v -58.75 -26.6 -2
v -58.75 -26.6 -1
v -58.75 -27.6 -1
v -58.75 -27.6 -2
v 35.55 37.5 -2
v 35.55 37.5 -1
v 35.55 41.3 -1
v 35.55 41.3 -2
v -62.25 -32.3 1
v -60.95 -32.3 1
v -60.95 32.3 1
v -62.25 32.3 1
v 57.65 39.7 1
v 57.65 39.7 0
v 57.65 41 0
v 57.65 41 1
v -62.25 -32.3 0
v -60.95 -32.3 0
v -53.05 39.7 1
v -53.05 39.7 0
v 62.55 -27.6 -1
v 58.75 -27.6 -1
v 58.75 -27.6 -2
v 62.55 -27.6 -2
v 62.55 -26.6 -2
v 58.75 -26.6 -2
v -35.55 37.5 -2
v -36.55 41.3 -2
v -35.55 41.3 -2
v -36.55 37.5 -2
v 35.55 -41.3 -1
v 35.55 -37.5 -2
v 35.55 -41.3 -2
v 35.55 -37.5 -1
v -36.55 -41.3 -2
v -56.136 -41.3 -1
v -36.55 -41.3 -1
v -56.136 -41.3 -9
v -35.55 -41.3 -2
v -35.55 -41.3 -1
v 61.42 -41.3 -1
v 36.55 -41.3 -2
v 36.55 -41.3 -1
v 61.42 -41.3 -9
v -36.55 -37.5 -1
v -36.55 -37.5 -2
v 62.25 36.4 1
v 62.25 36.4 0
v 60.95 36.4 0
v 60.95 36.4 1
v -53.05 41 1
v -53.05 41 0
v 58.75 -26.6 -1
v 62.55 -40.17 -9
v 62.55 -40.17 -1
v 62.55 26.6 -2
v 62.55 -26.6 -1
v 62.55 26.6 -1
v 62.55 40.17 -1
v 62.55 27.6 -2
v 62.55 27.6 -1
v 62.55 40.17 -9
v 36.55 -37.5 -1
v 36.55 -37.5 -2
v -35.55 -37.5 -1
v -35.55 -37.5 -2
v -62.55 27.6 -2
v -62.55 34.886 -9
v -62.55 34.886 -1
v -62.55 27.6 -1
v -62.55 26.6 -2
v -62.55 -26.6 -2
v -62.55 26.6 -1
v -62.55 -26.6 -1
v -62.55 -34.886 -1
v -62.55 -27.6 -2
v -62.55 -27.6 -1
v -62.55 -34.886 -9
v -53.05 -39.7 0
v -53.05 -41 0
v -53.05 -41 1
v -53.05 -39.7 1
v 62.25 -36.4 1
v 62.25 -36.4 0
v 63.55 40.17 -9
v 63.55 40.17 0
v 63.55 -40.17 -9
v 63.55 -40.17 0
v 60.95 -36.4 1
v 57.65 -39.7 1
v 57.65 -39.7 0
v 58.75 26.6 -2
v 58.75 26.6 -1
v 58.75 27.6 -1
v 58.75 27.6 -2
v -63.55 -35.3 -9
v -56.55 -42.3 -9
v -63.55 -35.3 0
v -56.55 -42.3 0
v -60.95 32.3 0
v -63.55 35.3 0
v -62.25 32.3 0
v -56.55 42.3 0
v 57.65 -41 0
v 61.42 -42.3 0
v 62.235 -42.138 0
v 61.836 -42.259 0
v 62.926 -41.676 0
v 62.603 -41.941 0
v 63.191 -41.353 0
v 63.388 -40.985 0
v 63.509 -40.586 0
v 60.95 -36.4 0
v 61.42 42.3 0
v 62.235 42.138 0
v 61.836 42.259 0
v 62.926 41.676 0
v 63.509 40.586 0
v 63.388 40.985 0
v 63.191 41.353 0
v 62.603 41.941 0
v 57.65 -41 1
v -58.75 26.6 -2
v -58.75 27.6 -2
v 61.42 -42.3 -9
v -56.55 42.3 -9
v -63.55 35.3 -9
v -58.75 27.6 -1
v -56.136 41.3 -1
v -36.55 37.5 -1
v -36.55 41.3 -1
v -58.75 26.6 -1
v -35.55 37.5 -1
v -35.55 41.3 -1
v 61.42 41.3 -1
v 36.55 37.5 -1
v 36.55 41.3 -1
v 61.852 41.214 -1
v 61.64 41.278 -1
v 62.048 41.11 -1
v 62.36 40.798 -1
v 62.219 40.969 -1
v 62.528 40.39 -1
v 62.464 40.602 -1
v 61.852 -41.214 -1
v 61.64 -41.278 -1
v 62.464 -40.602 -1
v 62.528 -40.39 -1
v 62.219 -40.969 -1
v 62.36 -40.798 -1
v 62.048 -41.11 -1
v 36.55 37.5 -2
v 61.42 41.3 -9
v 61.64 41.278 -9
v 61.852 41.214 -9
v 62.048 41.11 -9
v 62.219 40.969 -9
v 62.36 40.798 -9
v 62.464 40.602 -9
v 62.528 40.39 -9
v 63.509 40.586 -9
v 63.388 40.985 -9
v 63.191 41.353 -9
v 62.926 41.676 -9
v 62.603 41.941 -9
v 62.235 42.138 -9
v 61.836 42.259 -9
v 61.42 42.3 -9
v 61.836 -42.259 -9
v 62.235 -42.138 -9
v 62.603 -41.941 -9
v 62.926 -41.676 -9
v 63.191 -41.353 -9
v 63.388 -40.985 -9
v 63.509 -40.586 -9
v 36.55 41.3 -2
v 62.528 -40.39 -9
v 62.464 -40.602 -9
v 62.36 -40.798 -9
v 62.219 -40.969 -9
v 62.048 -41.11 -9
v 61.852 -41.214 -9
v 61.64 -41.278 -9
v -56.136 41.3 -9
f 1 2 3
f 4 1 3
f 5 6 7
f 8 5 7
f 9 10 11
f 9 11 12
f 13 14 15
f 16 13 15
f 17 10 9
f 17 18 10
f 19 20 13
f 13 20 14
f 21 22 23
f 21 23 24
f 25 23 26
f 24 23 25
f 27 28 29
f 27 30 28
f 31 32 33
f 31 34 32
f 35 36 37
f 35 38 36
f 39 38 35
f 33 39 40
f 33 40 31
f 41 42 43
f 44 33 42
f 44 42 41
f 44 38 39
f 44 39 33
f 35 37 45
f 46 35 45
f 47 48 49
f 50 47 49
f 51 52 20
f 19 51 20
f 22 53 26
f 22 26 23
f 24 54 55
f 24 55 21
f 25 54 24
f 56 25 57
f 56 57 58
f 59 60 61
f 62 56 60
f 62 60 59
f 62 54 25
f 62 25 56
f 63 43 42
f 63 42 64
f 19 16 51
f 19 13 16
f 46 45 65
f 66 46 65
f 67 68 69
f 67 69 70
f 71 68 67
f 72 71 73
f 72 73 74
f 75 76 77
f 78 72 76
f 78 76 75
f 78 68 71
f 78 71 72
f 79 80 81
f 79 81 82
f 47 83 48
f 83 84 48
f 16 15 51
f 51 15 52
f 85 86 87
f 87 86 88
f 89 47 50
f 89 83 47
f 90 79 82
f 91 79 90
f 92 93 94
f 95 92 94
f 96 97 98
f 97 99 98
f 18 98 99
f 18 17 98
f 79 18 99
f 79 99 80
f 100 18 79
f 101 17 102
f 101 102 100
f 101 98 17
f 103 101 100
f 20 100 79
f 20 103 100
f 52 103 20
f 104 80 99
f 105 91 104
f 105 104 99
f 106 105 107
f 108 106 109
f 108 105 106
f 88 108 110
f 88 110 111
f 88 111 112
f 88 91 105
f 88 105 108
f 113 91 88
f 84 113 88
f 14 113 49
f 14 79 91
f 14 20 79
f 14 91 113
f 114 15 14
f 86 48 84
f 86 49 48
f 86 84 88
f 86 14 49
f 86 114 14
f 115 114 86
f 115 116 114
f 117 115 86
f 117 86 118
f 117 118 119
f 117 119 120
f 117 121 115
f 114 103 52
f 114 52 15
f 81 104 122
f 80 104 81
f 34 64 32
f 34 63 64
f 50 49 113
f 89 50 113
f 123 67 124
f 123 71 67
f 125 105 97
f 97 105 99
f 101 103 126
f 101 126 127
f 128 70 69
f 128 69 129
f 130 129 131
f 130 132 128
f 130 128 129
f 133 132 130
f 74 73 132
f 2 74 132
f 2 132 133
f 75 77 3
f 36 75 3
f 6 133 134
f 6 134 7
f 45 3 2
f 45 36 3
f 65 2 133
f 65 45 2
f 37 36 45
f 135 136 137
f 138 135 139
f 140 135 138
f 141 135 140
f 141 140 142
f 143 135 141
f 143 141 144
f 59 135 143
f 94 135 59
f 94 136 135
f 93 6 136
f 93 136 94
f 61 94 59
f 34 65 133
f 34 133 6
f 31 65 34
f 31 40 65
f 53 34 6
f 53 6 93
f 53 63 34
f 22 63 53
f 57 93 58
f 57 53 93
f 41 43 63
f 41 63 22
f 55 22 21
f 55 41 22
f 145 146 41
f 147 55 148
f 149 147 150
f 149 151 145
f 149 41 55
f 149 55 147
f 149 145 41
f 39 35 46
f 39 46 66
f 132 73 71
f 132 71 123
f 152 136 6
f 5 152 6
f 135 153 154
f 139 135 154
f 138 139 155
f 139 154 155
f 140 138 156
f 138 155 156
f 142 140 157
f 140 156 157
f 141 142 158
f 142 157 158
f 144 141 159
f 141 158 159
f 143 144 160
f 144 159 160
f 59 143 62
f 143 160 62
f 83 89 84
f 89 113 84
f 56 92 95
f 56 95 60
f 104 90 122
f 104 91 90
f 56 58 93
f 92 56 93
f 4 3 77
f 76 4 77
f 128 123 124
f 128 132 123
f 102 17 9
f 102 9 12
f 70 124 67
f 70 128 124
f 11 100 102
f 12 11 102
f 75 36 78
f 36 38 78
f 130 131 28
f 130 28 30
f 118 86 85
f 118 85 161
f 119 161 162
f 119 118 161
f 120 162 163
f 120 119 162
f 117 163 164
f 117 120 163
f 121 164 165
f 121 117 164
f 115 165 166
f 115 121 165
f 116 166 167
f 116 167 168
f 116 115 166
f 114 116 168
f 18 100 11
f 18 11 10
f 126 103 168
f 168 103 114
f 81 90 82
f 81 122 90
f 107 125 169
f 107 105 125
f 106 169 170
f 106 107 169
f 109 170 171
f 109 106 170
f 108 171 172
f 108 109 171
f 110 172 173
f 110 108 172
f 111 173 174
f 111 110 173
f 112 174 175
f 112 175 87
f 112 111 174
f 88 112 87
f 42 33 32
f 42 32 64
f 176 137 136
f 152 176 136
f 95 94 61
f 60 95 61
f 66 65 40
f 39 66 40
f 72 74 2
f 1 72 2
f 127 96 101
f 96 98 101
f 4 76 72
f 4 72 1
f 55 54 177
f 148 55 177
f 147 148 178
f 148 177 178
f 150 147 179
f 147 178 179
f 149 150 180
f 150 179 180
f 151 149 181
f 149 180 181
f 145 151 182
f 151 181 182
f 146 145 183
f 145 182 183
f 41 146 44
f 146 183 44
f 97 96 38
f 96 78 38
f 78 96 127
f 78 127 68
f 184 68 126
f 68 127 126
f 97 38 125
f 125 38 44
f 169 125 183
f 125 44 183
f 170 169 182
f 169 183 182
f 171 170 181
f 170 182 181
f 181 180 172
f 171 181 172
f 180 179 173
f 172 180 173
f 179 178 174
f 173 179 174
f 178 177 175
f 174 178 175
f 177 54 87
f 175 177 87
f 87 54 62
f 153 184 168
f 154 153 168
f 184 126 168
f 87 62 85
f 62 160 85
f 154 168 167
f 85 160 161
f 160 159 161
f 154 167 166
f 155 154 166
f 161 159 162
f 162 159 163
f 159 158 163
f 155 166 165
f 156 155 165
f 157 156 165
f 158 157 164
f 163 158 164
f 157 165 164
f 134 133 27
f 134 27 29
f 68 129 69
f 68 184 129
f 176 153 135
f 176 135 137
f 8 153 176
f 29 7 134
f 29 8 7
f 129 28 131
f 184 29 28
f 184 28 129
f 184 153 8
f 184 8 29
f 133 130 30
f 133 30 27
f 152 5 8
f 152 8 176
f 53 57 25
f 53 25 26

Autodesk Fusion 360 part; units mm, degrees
sketch "Sketch1" plane through (0, 0, 0) normal (0, 0, 1) x (1, 0, 0)
  line L0 (61.42, -42.3) -> (-56.55, -42.3)
  line L1 (-63.55, -35.3) -> (-63.55, 35.3)
  line L2 (-56.55, 42.3) -> (61.42, 42.3)
  line L3 (63.55, 40.17) -> (63.55, -40.17)
  line L4 (63.55, -42.3) -> (-63.55, 42.3) construction
  line L5 (-63.55, -42.3) -> (63.55, 42.3) construction
  line L6 (-56.55, 42.3) -> (-63.55, 35.3)
  line L7 (0, -42.3) -> (0, 42.3) construction
  line L8 (63.55, 0) -> (-63.55, 0) construction
  line L9 (-56.55, -42.3) -> (-63.55, -35.3)
  arc A0 (63.55, 40.17) -> (61.42, 42.3) centre (61.42, 40.17) ccw
  arc A1 (61.42, -42.3) -> (63.55, -40.17) centre (61.42, -40.17) ccw
  dimension "d1" = 84.6
  dimension "d2" = 127.1
  dimension "d3" = 7
  dimension "d4" = 7
  dimension "d5" = 2.13
extrude "Extrude1" add sketch "Sketch1" against normal blind 9
sketch "Sketch2" plane through (0, 0, -9) normal (0, 0, -1) x (1, 0, 0)
  line L0 (61.42, 42.3) -> (-56.55, 42.3)
  line L1 (-56.55, 42.3) -> (-63.55, 35.3)
  line L2 (-63.55, 35.3) -> (-63.55, -35.3)
  line L3 (-63.55, -35.3) -> (-56.55, -42.3)
  line L4 (-56.55, -42.3) -> (61.42, -42.3)
  arc A0 (61.42, -42.3) -> (63.55, -40.17) centre (61.42, -40.17) ccw
  line L5 (63.55, -40.17) -> (63.55, 40.17)
  arc A1 (63.55, 40.17) -> (61.42, 42.3) centre (61.42, 40.17) ccw
  line L6 (61.42, -41.3) -> (-56.1358, -41.3)
  line L7 (-62.55, -34.8858) -> (-62.55, 34.8858)
  line L8 (-56.1358, 41.3) -> (61.42, 41.3)
  line L9 (62.55, 40.17) -> (62.55, -40.17)
  line L10 (62.55, -41.3) -> (-62.55, 41.3) construction
  line L11 (-62.55, -41.3) -> (62.55, 41.3) construction
  line L12 (-56.1358, 41.3) -> (-62.55, 34.8858)
  arc A2 (62.55, 40.17) -> (61.42, 41.3) centre (61.42, 40.17) ccw
  line L13 (63.55, 0) -> (-63.55, 0) construction
  line L14 (-56.1358, -41.3) -> (-62.55, -34.8858)
  arc A3 (61.42, -41.3) -> (62.55, -40.17) centre (61.42, -40.17) ccw
  dimension "d8" = 125.1
  dimension "d9" = 82.6
  dimension "d10" = 6.4142
  dimension "d11" = 6.4142
  dimension "d12" = 1
  dimension "d13" = 1.13
extrude "Extrude2" cut sketch "Sketch2" against normal blind 8 contours L6 L7 L8 L9 L12 A2 L14 A3
sketch "Sketch3" plane through (0, 0, -1) normal (0, 0, -1) x (1, 0, 0)
  line L0 (-56.1358, -41.3) -> (61.42, -41.3)
  arc A0 (61.42, -41.3) -> (62.55, -40.17) centre (61.42, -40.17) ccw
  line L1 (62.55, -40.17) -> (62.55, 40.17)
  arc A1 (62.55, 40.17) -> (61.42, 41.3) centre (61.42, 40.17) ccw
  line L2 (61.42, 41.3) -> (-56.1358, 41.3)
  line L3 (-56.1358, 41.3) -> (-62.55, 34.8858)
  line L4 (-62.55, 34.8858) -> (-62.55, -34.8858)
  line L5 (-62.55, -34.8858) -> (-56.1358, -41.3)
  line L6 (-62.55, 32.8642) -> (-35.55, 32.8642) construction
  line L7 (-35.55, 32.8642) -> (-35.55, 41.3) construction
  line L8 (-35.55, 41.3) -> (-36.55, 41.3)
  line L9 (-36.55, 41.3) -> (-36.55, 37.5)
  line L10 (-36.55, 37.5) -> (-35.55, 37.5)
  line L11 (-35.55, 37.5) -> (-35.55, 41.3)
  line L12 (-50.2731, 41.3) -> (-50.2731, 26.6) construction
  line L13 (-50.2731, 26.6) -> (-62.55, 26.6) construction
  line L14 (-62.55, 26.6) -> (-58.75, 26.6)
  line L15 (-58.75, 26.6) -> (-58.75, 27.6)
  line L16 (-58.75, 27.6) -> (-62.55, 27.6)
  line L17 (-62.55, 27.6) -> (-62.55, 26.6)
  line L18 (62.55, 0) -> (-62.55, 0) construction
  line L19 (-62.55, 30.673) -> (-62.55, 55) construction
  line L20 (62.55, 34.8173) -> (62.55, 55) construction
  line L21 (62.55, 55) -> (-62.55, 55) construction
  line L22 (0, 55) -> (0, -41.3) construction
  line L23 (62.55, 27.6) -> (62.55, 26.6)
  line L24 (62.55, 26.6) -> (58.75, 26.6)
  line L25 (58.75, 27.6) -> (62.55, 27.6)
  line L26 (58.75, 26.6) -> (58.75, 27.6)
  line L27 (36.55, 41.3) -> (36.55, 37.5)
  line L28 (35.55, 37.5) -> (35.55, 41.3)
  line L29 (36.55, 37.5) -> (35.55, 37.5)
  line L30 (35.55, 41.3) -> (36.55, 41.3)
  line L31 (62.55, -26.6) -> (58.75, -26.6)
  line L32 (58.75, -27.6) -> (62.55, -27.6)
  line L33 (58.75, -26.6) -> (58.75, -27.6)
  line L34 (35.55, -37.5) -> (35.55, -41.3)
  line L35 (36.55, -37.5) -> (35.55, -37.5)
  line L36 (36.55, -41.3) -> (36.55, -37.5)
  line L37 (62.55, -27.6) -> (62.55, -26.6)
  line L38 (35.55, -41.3) -> (36.55, -41.3)
  line L39 (-58.75, -26.6) -> (-58.75, -27.6)
  line L40 (-62.55, -26.6) -> (-58.75, -26.6)
  line L41 (-58.75, -27.6) -> (-62.55, -27.6)
  line L42 (-62.55, -27.6) -> (-62.55, -26.6)
  line L43 (-36.55, -37.5) -> (-35.55, -37.5)
  line L44 (-35.55, -37.5) -> (-35.55, -41.3)
  line L45 (-36.55, -41.3) -> (-36.55, -37.5)
  line L46 (-35.55, -41.3) -> (-36.55, -41.3)
  dimension "d16" = 27
  dimension "d17" = 3.8
  dimension "d18" = 1
  dimension "d19" = 14.7
  dimension "d20" = 3.8
  dimension "d21" = 1
extrude "Extrude3" add sketch "Sketch3" along normal blind 1 contours L0 L43 L44 L45 L46 | L4 L39 L40 L41 L42 | L0 L34 L35 L36 L38 | L4 L14 L15 L16 L17 | L1 L31 L32 L33 L37 | L2 L8 L9 L10 L11 | L1 L23 L24 L25 L26 | L2 L27 L28 L29 L30
sketch "Sketch4" plane through (0, 0, 0) normal (0, 0, 1) x (-1, 0, 0)
  line L0 (56.55, 42.3) -> (-61.42, 42.3)
  arc A0 (-61.42, 42.3) -> (-63.55, 40.17) centre (-61.42, 40.17) ccw
  line L1 (-63.55, 40.17) -> (-63.55, -40.17)
  arc A1 (-63.55, -40.17) -> (-61.42, -42.3) centre (-61.42, -40.17) ccw
  line L2 (-61.42, -42.3) -> (56.55, -42.3)
  line L3 (56.55, -42.3) -> (63.55, -35.3)
  line L4 (63.55, -35.3) -> (63.55, 35.3)
  line L5 (63.55, 35.3) -> (56.55, 42.3)
  line L6 (-63.55, -34.3916) -> (-62.25, -34.3916) construction
  line L7 (-62.25, -34.3916) -> (-62.25, -36.4) construction
  line L8 (-60, -42.3) -> (-66.2, -42.3) construction
  line L9 (-63.55, -39.2433) -> (-63.55, -43.1) construction
  line L10 (-62.25, -36.4) -> (-60.95, -36.4)
  line L11 (-60.95, -36.4) -> (-60.95, 36.4)
  line L12 (-60.95, 36.4) -> (-62.25, 36.4)
  line L13 (-62.25, 36.4) -> (-62.25, -36.4)
  line L14 (-52.6219, -42.3) -> (-52.6219, -41) construction
  line L15 (-52.6219, -41) -> (-57.65, -41) construction
  line L16 (-57.65, -41) -> (53.05, -41)
  line L17 (53.05, -41) -> (53.05, -39.7)
  line L18 (53.05, -39.7) -> (-57.65, -39.7)
  line L19 (-57.65, -39.7) -> (-57.65, -41)
  line L20 (53.05, 39.7) -> (-57.65, 39.7)
  line L21 (-57.65, 41) -> (53.05, 41)
  line L22 (-57.65, 39.7) -> (-57.65, 41)
  line L23 (53.05, 41) -> (53.05, 39.7)
  line L24 (60.95, 0) -> (60.95, -32.3)
  line L25 (60.95, -32.3) -> (62.25, -32.3)
  line L26 (62.25, -32.3) -> (62.25, 0)
  line L27 (60.95, 0) -> (60.95, 32.3)
  line L28 (62.25, 32.3) -> (62.25, 0)
  line L29 (60.95, 32.3) -> (62.25, 32.3)
  line L30 (-63.55, 0) -> (60.95, 0) construction
  line L31 (62.25, 0) -> (63.55, 0) construction
  dimension "d24" = 1.3
  dimension "d25" = 5.9
  dimension "d26" = 72.8
  dimension "d27" = 1.3
  dimension "d28" = 1.3
  dimension "d29" = 5.9
  dimension "d30" = 1.3
  dimension "d31" = 110.7
  dimension "d32" = 32.3
  dimension "d33" = 1.3
  dimension "d34" = 1.3
extrude "Extrude4" add sketch "Sketch4" along normal blind 1 contours L10 L11 L12 L13 | L16 L17 L18 L19 | L20 L21 L22 L23 | L24 L25 L26 L27 L28 L29
equation "d4 = d3"
equation "d11 = d10"
